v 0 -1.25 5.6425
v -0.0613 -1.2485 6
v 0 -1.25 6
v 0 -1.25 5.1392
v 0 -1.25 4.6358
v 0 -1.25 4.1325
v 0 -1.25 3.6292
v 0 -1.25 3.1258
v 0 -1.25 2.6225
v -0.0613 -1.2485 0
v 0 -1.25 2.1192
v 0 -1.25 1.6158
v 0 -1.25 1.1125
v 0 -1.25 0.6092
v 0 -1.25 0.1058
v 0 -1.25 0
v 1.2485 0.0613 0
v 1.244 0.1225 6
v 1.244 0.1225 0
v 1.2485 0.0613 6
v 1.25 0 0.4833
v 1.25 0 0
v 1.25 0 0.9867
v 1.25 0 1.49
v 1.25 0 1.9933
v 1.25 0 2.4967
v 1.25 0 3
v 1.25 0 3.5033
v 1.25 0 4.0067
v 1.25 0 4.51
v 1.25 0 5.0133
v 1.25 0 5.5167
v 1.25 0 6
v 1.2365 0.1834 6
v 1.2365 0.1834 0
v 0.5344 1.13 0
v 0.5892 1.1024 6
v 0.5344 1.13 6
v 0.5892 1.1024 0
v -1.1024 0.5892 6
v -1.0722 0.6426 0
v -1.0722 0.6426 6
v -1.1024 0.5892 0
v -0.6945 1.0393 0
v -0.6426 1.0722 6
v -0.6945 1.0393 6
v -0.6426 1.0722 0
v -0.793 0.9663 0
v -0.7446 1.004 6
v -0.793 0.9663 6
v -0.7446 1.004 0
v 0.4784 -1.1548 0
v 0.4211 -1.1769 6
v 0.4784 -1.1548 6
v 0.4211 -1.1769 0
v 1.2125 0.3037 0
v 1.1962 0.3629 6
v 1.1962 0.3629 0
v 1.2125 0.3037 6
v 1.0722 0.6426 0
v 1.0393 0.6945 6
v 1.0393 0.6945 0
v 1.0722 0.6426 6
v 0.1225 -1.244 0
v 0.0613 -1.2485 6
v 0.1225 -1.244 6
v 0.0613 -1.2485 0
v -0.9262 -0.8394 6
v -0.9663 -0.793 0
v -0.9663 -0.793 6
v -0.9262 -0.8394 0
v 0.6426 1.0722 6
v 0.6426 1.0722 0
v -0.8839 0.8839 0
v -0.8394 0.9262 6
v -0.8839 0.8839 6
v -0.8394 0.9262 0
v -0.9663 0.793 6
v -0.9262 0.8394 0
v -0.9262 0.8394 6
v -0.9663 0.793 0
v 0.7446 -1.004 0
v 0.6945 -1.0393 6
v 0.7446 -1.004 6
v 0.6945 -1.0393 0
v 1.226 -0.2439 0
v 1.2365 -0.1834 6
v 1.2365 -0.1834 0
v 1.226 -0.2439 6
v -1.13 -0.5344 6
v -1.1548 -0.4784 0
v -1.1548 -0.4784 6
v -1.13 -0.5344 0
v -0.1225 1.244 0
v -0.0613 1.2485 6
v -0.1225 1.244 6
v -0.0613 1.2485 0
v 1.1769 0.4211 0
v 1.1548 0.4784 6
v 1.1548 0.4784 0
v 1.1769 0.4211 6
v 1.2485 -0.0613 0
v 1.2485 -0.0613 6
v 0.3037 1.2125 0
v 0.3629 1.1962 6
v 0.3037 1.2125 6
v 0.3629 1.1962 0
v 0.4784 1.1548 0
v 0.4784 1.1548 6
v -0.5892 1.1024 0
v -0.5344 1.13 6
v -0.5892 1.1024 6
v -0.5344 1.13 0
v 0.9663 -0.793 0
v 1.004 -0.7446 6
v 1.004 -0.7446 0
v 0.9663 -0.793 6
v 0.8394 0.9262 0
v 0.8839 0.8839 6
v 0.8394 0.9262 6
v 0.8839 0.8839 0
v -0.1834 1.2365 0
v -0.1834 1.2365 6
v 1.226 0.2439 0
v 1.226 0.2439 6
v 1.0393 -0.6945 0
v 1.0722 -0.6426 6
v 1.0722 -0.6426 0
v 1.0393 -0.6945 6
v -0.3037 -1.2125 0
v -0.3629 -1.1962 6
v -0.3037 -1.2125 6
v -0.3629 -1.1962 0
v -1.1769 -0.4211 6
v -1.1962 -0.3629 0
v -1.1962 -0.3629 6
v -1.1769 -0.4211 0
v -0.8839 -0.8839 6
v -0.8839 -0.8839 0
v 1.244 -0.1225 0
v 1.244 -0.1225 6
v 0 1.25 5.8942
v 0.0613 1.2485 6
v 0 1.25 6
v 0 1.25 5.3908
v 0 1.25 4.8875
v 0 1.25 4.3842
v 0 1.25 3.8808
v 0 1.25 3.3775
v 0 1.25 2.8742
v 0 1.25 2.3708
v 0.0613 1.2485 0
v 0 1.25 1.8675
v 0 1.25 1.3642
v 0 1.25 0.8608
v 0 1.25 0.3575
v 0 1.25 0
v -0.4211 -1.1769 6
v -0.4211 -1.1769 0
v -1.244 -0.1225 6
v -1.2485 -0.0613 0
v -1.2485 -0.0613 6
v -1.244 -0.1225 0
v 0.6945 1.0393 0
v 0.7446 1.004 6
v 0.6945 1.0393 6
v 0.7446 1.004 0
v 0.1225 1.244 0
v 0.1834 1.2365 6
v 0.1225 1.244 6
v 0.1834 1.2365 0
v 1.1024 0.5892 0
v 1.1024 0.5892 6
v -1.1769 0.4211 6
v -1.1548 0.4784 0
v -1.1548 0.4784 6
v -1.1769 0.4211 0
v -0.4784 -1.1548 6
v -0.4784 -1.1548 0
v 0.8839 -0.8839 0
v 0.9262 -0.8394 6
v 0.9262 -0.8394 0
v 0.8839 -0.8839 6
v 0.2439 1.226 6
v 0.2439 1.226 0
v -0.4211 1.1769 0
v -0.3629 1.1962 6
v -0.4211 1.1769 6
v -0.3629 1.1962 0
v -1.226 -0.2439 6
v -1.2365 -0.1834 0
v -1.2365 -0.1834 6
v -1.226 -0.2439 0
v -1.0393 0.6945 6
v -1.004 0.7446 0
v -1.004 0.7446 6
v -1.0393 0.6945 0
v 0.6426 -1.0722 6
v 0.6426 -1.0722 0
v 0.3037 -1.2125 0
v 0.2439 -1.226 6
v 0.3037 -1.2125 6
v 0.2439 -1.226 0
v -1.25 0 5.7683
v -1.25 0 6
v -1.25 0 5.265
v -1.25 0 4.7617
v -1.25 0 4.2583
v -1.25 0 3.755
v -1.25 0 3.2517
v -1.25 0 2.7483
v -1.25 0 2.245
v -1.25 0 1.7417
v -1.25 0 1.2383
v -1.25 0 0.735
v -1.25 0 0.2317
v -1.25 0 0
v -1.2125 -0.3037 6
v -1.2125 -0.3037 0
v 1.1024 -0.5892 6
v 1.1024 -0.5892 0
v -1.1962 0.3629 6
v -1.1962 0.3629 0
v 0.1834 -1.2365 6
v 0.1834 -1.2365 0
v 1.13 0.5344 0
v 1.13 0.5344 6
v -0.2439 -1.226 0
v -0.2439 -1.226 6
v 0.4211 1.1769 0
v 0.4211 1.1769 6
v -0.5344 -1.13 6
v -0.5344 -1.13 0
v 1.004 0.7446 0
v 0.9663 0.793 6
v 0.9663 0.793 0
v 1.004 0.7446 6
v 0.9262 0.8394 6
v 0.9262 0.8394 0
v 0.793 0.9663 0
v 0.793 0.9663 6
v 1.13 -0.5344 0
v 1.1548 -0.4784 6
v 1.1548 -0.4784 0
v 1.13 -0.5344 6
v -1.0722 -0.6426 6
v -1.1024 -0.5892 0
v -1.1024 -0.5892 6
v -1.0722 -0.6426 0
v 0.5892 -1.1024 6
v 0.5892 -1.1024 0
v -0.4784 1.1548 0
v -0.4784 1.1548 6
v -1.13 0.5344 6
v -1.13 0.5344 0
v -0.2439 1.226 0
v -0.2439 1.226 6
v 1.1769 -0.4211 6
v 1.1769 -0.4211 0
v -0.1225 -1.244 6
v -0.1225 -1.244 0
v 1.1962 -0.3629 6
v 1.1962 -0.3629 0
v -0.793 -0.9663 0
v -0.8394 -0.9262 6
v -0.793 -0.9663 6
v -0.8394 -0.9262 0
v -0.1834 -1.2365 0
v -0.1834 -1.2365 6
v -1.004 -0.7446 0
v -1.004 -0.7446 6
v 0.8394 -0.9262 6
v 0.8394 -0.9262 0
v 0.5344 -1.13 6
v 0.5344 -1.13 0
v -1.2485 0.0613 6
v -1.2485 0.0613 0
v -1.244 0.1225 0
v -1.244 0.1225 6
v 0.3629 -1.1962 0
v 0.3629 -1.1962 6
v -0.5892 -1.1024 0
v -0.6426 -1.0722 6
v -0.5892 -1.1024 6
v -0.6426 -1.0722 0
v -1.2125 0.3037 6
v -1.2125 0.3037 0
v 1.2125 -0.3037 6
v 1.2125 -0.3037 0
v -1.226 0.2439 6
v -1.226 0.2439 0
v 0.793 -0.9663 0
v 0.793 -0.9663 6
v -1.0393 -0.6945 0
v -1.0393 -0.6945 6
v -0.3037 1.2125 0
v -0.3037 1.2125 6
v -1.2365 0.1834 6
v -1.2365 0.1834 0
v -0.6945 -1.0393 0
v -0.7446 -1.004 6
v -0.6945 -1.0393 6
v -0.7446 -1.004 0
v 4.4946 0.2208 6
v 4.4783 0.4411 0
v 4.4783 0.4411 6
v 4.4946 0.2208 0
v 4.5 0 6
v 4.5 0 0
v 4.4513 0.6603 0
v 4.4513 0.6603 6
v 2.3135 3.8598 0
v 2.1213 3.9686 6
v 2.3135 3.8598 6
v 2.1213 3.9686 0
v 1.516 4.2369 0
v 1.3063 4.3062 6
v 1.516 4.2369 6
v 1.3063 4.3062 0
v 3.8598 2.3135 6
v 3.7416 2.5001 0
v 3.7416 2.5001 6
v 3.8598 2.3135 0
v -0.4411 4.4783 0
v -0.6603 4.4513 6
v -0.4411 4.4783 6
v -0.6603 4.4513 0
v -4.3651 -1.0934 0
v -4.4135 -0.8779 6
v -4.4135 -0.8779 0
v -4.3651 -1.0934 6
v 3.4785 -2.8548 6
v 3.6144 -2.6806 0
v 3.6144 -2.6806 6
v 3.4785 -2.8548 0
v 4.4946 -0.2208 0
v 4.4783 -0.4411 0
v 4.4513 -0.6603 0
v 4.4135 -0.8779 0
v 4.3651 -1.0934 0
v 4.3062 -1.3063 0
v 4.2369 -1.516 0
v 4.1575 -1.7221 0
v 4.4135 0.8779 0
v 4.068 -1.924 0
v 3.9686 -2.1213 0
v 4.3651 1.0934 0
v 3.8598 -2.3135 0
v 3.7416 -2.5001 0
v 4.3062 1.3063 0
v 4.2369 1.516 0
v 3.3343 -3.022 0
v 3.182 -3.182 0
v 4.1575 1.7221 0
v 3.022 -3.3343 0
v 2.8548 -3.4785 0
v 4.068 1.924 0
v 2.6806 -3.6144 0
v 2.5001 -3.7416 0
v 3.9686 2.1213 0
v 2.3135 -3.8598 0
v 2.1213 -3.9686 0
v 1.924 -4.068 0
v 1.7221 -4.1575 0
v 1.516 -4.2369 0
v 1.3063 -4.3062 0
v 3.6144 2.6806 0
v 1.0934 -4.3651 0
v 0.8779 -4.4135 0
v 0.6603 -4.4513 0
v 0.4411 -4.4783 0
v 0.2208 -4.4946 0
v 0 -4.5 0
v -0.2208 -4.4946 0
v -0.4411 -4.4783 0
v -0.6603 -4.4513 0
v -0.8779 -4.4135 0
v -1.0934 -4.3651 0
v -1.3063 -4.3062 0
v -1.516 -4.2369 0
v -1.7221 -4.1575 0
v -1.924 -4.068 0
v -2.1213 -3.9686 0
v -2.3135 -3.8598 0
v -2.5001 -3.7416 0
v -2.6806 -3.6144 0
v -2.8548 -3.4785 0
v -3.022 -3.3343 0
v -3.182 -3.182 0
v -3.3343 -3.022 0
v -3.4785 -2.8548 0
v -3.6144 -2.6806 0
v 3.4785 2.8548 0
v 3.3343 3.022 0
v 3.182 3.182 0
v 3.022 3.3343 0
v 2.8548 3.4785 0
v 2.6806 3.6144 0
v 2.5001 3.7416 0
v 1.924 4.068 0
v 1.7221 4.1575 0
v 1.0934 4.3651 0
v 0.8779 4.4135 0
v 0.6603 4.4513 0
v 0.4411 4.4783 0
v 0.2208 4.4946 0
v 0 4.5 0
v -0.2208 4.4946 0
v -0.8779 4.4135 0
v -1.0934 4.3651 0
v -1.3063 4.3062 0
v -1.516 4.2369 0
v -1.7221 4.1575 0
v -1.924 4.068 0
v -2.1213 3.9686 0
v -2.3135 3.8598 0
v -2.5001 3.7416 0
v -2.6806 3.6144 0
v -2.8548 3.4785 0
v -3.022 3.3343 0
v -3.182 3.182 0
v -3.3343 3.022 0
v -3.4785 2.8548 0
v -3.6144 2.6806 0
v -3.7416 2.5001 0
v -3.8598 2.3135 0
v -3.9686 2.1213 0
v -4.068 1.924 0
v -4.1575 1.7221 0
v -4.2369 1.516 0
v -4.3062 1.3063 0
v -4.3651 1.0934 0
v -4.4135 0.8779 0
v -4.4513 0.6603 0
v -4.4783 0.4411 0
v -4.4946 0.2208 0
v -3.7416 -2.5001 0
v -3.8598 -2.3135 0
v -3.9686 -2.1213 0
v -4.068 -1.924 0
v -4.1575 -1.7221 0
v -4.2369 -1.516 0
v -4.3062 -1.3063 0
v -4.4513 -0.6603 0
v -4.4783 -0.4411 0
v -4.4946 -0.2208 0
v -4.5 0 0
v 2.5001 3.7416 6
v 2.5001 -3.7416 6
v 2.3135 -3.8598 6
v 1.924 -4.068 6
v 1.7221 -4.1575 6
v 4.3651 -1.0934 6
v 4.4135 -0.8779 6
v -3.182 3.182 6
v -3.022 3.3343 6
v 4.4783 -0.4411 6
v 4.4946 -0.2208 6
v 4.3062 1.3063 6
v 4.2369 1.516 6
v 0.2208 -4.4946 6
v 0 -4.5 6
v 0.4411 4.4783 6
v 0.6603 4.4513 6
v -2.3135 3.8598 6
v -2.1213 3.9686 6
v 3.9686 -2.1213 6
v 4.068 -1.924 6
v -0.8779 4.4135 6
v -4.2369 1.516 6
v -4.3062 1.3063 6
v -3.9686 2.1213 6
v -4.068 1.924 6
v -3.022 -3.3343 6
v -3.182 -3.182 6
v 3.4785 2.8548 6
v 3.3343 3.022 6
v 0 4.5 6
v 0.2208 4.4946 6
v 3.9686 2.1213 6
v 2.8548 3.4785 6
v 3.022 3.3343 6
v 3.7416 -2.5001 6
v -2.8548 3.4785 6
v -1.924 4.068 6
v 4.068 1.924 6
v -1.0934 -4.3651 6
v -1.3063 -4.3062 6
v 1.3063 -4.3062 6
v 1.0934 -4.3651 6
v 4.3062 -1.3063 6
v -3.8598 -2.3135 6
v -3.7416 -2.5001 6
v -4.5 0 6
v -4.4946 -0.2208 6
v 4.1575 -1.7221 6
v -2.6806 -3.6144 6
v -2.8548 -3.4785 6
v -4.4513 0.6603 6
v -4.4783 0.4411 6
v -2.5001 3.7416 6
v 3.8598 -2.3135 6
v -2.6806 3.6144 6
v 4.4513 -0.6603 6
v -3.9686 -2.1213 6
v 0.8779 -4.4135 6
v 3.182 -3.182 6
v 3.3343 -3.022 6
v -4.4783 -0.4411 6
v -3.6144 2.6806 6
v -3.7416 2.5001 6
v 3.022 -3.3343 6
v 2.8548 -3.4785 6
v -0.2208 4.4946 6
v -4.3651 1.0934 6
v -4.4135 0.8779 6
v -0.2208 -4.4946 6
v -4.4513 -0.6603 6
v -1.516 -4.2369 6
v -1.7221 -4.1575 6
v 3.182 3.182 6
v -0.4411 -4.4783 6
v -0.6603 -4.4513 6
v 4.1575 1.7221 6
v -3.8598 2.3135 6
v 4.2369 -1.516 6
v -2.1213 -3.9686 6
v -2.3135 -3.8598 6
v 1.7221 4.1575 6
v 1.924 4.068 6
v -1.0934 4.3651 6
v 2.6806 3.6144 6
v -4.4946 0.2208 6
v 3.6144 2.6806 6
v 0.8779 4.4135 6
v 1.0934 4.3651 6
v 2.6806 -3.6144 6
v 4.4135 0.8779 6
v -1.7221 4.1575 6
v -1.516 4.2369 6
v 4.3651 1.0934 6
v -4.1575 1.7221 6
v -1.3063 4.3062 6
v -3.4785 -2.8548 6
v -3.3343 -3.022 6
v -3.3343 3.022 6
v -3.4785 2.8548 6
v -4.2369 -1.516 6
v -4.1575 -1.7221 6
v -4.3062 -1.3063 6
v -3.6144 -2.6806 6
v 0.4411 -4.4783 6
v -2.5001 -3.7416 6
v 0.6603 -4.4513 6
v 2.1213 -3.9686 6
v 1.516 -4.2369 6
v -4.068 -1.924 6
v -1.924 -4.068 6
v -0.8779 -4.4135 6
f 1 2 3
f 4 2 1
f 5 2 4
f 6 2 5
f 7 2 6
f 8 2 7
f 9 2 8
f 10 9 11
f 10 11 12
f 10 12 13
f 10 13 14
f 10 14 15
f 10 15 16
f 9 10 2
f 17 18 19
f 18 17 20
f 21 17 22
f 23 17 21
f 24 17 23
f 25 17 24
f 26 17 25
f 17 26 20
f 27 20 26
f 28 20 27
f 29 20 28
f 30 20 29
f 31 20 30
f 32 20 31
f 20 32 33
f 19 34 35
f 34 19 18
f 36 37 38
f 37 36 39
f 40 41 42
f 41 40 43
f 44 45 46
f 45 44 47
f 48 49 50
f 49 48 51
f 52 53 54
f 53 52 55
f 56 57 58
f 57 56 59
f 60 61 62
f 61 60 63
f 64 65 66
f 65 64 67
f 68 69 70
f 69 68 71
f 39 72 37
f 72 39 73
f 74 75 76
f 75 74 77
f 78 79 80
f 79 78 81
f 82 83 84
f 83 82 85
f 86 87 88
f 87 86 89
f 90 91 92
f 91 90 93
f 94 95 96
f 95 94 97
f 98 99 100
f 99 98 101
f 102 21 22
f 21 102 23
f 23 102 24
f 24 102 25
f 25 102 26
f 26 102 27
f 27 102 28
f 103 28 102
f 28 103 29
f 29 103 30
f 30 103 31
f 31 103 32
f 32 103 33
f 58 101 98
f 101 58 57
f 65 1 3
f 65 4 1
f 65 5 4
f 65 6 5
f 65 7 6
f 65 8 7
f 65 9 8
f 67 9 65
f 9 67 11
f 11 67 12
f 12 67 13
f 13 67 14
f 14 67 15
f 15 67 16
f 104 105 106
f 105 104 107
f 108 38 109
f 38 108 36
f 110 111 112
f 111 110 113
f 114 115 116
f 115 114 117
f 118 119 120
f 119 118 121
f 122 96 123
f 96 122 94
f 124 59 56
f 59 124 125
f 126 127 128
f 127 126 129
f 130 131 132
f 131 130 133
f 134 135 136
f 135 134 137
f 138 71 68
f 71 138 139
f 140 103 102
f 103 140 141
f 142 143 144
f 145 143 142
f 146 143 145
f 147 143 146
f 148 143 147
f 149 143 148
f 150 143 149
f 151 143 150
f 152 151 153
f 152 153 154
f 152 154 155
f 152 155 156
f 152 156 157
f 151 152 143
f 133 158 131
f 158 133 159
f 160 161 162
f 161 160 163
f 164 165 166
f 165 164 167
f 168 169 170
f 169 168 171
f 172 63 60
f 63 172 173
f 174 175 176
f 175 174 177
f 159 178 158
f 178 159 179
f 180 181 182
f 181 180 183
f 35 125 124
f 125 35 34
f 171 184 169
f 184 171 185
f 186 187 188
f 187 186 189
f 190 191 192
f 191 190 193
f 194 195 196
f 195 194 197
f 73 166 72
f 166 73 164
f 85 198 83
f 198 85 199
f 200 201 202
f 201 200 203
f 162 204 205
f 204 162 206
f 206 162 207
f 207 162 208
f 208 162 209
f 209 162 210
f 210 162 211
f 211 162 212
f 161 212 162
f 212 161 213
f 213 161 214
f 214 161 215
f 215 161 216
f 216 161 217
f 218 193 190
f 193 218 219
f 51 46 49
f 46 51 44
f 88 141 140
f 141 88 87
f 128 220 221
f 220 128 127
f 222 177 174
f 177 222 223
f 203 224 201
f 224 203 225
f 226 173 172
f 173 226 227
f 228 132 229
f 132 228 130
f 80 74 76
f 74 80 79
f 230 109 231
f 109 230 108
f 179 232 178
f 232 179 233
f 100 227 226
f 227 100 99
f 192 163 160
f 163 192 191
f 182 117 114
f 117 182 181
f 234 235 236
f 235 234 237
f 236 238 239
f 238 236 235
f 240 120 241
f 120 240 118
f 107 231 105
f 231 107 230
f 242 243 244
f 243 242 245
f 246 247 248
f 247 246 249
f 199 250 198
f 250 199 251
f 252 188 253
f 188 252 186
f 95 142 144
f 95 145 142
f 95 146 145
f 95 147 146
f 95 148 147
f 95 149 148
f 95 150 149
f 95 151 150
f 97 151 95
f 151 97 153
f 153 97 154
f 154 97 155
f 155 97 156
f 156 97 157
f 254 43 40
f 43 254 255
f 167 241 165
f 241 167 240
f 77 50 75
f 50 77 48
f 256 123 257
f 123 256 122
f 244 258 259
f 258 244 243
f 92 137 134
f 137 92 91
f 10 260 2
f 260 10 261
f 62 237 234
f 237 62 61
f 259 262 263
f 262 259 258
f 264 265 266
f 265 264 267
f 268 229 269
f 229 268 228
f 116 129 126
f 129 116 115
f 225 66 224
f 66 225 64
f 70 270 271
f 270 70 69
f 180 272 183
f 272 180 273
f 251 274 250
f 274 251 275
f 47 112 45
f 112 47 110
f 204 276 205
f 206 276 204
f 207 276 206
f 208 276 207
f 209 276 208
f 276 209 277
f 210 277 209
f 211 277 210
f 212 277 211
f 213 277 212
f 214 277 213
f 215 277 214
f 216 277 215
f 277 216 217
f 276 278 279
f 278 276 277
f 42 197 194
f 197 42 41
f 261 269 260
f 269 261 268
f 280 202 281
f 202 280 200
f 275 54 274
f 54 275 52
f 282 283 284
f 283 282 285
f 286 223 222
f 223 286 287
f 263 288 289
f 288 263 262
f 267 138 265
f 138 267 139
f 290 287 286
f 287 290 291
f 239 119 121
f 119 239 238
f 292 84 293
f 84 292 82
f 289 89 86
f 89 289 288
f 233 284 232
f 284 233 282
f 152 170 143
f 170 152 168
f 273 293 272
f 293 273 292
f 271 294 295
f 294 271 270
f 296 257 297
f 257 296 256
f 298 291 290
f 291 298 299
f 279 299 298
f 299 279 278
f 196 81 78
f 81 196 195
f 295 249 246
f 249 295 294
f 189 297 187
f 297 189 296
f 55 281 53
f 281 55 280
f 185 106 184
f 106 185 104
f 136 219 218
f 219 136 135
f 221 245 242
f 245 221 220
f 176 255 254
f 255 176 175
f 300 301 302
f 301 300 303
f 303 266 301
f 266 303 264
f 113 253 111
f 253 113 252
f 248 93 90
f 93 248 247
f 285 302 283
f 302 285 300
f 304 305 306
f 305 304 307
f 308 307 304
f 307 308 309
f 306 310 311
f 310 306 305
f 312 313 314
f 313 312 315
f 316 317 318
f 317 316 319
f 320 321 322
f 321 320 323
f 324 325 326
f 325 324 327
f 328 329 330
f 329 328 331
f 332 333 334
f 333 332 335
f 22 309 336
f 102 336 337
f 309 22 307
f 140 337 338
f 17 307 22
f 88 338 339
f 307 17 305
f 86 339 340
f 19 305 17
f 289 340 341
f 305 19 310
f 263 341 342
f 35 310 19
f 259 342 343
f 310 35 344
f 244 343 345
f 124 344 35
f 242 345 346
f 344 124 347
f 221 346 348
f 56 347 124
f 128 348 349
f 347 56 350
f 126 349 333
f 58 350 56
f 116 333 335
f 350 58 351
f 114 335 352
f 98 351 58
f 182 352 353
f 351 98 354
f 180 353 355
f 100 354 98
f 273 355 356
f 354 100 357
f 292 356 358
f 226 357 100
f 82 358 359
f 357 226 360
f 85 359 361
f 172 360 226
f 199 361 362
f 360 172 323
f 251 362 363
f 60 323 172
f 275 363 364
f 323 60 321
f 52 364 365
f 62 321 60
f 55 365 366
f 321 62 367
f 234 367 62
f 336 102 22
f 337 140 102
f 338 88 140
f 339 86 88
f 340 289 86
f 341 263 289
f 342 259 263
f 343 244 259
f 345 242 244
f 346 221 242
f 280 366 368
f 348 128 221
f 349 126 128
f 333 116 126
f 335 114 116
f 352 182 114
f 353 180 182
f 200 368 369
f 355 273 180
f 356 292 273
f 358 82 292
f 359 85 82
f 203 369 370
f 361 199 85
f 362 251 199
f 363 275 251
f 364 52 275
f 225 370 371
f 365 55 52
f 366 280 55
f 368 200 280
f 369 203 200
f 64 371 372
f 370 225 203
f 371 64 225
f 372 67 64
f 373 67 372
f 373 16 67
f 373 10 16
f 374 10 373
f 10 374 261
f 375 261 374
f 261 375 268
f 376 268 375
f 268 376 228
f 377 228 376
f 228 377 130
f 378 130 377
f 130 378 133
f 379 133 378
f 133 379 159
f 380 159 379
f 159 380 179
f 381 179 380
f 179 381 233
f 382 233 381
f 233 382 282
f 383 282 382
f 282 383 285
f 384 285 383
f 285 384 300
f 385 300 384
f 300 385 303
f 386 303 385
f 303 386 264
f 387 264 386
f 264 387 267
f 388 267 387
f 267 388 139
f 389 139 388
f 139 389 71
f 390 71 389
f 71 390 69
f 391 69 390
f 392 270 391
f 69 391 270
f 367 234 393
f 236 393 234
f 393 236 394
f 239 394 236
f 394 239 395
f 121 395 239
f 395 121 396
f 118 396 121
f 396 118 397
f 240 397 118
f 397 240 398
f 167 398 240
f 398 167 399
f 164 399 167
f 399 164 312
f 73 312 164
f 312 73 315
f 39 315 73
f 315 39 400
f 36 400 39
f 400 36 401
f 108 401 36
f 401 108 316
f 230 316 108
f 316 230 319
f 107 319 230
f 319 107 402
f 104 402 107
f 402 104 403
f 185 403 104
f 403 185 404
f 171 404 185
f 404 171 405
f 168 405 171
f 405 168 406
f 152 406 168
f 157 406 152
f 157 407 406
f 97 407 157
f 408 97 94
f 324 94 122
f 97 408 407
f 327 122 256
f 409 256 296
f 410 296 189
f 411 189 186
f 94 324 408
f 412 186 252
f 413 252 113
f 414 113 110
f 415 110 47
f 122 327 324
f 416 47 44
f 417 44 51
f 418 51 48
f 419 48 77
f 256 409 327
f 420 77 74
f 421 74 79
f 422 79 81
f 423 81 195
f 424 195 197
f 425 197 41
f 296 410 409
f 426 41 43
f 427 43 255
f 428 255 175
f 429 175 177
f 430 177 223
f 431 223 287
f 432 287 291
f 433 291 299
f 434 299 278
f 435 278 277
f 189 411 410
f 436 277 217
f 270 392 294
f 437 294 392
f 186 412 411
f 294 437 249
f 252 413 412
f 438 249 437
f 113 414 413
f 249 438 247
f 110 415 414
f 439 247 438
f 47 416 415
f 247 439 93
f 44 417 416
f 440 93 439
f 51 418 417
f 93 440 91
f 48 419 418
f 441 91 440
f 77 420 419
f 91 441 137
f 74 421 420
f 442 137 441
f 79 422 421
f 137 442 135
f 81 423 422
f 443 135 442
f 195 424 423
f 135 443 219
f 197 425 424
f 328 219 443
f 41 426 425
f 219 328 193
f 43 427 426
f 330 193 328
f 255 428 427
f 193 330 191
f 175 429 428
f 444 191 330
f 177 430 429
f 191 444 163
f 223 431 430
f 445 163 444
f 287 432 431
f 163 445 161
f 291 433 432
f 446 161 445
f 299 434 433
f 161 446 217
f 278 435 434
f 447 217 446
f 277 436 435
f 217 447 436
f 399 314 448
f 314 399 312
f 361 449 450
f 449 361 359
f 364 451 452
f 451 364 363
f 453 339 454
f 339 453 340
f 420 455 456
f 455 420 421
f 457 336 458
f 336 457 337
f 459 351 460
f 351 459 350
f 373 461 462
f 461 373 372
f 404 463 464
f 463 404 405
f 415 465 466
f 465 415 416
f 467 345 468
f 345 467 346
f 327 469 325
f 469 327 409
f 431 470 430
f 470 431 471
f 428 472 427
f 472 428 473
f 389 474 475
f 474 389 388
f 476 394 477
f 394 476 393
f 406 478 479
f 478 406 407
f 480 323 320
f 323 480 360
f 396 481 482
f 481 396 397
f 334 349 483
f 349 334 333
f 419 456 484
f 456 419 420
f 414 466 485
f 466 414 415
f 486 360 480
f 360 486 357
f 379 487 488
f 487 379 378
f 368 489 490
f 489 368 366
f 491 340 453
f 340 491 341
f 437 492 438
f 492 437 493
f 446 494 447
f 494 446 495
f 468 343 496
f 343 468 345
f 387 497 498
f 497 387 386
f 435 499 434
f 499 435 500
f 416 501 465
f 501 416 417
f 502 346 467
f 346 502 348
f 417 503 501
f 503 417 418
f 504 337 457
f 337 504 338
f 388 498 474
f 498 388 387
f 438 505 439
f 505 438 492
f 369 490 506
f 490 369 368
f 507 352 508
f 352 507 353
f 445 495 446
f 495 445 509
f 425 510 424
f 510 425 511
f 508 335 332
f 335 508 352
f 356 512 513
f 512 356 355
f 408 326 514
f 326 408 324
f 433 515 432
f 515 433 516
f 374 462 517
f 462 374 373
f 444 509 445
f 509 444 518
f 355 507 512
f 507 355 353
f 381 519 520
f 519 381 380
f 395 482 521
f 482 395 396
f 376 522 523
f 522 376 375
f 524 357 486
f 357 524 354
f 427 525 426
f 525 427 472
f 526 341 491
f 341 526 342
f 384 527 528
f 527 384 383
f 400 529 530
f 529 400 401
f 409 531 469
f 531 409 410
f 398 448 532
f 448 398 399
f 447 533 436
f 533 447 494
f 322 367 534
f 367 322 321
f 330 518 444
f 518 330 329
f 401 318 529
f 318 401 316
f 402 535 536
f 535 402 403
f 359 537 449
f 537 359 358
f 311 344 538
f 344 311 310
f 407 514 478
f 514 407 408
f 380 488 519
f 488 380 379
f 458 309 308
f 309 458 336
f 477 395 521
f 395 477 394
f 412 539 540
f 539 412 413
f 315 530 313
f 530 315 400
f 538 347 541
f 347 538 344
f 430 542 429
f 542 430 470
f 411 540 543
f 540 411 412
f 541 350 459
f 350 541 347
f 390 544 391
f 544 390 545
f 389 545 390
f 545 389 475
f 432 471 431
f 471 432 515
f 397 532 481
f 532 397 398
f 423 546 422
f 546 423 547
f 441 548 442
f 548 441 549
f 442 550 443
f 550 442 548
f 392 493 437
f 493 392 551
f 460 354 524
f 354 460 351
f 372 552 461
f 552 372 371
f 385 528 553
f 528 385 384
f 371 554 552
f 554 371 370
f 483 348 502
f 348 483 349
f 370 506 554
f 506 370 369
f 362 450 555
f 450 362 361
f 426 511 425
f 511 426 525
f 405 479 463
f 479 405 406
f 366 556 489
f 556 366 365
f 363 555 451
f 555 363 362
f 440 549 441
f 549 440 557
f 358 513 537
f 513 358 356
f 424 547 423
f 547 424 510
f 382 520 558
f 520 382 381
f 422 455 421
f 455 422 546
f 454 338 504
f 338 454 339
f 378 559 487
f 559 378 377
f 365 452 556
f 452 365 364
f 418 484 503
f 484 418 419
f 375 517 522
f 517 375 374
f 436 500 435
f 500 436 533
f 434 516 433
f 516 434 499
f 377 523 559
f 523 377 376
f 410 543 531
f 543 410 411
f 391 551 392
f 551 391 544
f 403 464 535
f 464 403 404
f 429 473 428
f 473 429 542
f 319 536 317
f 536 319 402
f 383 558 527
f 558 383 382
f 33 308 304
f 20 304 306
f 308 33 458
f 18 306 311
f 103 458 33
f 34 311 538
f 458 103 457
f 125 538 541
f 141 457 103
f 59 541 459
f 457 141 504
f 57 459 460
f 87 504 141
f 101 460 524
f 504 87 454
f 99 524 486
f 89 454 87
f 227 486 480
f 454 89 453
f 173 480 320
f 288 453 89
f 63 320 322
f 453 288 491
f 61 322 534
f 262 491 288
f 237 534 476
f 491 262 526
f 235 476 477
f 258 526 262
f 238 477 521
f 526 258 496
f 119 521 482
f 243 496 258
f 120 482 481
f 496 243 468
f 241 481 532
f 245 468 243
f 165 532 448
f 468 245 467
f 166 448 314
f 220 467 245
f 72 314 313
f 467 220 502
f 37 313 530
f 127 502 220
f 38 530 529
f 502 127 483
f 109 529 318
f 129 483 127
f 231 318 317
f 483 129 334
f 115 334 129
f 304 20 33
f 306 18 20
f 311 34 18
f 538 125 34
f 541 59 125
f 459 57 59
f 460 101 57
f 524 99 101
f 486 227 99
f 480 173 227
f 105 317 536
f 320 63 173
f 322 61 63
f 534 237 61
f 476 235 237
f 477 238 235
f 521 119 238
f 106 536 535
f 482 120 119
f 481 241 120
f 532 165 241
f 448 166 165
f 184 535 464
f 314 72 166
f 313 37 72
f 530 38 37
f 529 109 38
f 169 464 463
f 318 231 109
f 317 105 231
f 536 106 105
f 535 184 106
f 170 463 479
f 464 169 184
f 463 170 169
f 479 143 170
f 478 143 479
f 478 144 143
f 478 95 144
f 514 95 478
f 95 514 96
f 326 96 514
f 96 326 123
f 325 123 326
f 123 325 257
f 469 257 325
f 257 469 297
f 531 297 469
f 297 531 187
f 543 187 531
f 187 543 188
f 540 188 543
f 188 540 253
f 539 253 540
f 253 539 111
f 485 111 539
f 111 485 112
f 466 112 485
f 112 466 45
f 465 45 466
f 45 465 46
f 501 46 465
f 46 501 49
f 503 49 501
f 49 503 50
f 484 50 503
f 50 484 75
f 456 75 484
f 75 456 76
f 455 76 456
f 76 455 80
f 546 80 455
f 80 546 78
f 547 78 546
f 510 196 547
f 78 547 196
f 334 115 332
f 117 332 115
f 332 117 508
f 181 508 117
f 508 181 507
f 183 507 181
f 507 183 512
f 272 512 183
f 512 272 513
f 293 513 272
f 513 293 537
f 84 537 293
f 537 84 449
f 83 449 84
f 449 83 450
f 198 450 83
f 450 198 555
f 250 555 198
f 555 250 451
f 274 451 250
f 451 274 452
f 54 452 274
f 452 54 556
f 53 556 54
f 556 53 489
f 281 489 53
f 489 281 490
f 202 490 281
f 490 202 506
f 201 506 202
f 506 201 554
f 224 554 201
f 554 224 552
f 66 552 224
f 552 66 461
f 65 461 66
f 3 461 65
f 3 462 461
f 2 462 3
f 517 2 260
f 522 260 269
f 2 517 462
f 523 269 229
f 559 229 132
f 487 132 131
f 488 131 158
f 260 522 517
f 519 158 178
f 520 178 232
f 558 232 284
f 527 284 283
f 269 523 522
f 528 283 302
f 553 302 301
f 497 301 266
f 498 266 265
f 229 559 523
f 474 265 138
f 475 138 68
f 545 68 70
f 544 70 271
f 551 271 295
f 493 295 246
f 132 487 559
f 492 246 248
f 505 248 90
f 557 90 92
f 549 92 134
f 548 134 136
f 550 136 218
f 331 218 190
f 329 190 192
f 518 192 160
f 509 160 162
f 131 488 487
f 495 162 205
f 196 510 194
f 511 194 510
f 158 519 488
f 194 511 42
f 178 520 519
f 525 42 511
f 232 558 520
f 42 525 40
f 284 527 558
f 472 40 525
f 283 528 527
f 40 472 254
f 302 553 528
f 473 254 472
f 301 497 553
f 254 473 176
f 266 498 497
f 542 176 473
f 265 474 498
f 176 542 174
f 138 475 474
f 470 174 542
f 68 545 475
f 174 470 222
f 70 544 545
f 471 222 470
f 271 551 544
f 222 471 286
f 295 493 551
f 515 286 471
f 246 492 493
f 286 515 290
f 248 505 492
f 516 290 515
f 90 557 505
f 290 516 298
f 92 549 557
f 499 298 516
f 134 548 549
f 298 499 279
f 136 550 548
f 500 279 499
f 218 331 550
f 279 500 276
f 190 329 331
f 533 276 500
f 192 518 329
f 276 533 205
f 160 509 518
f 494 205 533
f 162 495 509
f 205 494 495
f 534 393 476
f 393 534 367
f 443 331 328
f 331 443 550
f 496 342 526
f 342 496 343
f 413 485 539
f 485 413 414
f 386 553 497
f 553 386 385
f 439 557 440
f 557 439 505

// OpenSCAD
$fn = 128;

// Standoff pillar: 6.0mm long, 9.0mm outer diameter, M3 (3.0mm) threaded THROUGH hole
thread_d = 3.0;   // nominal thread major diameter (mm)
length   = 6.0;   // overall length (mm)
outer_d  = 9.0;   // "Nonemm" interpreted as 9mm OD

// Internal thread approximation (helical groove) for a through-hole
pitch        = 0.5;   // visible/printable pitch
thread_depth = 0.25;  // radial depth of groove
starts       = 1;
eps          = 0.02;

module internal_thread_hole(d_major, L, p, depth, nstarts=1) {
    // Base clearance hole at (approx) minor diameter, then subtract a helical groove
    d_minor = max(d_major - 2*depth, 0.1);
    turns   = L / p;

    difference() {
        // Through hole core
        translate([0,0,-eps]) cylinder(d=d_minor, h=L + 2*eps);

        // Helical groove that increases effective diameter up toward d_major
        for (s = [0:nstarts-1]) {
            rotate([0,0, s*360/nstarts])
                translate([0,0,-eps])
                    linear_extrude(height=L + 2*eps, twist=360*turns, slices=max(ceil(turns*60), 60))
                        translate([d_minor/2, -p*0.18, 0])
                            square([depth, p*0.36], center=false);
        }
    }
}

module standoff_pillar(od, L, td) {
    // Ensure hole fits inside pillar wall
    d_major = min(td, od - 1.0);

    difference() {
        // Main pillar body
        cylinder(d=od, h=L);

        // Subtract threaded through-hole (connected solid remains)
        internal_thread_hole(d_major=d_major, L=L, p=pitch, depth=thread_depth, nstarts=starts);
    }
}

standoff_pillar(outer_d, length, thread_d);
